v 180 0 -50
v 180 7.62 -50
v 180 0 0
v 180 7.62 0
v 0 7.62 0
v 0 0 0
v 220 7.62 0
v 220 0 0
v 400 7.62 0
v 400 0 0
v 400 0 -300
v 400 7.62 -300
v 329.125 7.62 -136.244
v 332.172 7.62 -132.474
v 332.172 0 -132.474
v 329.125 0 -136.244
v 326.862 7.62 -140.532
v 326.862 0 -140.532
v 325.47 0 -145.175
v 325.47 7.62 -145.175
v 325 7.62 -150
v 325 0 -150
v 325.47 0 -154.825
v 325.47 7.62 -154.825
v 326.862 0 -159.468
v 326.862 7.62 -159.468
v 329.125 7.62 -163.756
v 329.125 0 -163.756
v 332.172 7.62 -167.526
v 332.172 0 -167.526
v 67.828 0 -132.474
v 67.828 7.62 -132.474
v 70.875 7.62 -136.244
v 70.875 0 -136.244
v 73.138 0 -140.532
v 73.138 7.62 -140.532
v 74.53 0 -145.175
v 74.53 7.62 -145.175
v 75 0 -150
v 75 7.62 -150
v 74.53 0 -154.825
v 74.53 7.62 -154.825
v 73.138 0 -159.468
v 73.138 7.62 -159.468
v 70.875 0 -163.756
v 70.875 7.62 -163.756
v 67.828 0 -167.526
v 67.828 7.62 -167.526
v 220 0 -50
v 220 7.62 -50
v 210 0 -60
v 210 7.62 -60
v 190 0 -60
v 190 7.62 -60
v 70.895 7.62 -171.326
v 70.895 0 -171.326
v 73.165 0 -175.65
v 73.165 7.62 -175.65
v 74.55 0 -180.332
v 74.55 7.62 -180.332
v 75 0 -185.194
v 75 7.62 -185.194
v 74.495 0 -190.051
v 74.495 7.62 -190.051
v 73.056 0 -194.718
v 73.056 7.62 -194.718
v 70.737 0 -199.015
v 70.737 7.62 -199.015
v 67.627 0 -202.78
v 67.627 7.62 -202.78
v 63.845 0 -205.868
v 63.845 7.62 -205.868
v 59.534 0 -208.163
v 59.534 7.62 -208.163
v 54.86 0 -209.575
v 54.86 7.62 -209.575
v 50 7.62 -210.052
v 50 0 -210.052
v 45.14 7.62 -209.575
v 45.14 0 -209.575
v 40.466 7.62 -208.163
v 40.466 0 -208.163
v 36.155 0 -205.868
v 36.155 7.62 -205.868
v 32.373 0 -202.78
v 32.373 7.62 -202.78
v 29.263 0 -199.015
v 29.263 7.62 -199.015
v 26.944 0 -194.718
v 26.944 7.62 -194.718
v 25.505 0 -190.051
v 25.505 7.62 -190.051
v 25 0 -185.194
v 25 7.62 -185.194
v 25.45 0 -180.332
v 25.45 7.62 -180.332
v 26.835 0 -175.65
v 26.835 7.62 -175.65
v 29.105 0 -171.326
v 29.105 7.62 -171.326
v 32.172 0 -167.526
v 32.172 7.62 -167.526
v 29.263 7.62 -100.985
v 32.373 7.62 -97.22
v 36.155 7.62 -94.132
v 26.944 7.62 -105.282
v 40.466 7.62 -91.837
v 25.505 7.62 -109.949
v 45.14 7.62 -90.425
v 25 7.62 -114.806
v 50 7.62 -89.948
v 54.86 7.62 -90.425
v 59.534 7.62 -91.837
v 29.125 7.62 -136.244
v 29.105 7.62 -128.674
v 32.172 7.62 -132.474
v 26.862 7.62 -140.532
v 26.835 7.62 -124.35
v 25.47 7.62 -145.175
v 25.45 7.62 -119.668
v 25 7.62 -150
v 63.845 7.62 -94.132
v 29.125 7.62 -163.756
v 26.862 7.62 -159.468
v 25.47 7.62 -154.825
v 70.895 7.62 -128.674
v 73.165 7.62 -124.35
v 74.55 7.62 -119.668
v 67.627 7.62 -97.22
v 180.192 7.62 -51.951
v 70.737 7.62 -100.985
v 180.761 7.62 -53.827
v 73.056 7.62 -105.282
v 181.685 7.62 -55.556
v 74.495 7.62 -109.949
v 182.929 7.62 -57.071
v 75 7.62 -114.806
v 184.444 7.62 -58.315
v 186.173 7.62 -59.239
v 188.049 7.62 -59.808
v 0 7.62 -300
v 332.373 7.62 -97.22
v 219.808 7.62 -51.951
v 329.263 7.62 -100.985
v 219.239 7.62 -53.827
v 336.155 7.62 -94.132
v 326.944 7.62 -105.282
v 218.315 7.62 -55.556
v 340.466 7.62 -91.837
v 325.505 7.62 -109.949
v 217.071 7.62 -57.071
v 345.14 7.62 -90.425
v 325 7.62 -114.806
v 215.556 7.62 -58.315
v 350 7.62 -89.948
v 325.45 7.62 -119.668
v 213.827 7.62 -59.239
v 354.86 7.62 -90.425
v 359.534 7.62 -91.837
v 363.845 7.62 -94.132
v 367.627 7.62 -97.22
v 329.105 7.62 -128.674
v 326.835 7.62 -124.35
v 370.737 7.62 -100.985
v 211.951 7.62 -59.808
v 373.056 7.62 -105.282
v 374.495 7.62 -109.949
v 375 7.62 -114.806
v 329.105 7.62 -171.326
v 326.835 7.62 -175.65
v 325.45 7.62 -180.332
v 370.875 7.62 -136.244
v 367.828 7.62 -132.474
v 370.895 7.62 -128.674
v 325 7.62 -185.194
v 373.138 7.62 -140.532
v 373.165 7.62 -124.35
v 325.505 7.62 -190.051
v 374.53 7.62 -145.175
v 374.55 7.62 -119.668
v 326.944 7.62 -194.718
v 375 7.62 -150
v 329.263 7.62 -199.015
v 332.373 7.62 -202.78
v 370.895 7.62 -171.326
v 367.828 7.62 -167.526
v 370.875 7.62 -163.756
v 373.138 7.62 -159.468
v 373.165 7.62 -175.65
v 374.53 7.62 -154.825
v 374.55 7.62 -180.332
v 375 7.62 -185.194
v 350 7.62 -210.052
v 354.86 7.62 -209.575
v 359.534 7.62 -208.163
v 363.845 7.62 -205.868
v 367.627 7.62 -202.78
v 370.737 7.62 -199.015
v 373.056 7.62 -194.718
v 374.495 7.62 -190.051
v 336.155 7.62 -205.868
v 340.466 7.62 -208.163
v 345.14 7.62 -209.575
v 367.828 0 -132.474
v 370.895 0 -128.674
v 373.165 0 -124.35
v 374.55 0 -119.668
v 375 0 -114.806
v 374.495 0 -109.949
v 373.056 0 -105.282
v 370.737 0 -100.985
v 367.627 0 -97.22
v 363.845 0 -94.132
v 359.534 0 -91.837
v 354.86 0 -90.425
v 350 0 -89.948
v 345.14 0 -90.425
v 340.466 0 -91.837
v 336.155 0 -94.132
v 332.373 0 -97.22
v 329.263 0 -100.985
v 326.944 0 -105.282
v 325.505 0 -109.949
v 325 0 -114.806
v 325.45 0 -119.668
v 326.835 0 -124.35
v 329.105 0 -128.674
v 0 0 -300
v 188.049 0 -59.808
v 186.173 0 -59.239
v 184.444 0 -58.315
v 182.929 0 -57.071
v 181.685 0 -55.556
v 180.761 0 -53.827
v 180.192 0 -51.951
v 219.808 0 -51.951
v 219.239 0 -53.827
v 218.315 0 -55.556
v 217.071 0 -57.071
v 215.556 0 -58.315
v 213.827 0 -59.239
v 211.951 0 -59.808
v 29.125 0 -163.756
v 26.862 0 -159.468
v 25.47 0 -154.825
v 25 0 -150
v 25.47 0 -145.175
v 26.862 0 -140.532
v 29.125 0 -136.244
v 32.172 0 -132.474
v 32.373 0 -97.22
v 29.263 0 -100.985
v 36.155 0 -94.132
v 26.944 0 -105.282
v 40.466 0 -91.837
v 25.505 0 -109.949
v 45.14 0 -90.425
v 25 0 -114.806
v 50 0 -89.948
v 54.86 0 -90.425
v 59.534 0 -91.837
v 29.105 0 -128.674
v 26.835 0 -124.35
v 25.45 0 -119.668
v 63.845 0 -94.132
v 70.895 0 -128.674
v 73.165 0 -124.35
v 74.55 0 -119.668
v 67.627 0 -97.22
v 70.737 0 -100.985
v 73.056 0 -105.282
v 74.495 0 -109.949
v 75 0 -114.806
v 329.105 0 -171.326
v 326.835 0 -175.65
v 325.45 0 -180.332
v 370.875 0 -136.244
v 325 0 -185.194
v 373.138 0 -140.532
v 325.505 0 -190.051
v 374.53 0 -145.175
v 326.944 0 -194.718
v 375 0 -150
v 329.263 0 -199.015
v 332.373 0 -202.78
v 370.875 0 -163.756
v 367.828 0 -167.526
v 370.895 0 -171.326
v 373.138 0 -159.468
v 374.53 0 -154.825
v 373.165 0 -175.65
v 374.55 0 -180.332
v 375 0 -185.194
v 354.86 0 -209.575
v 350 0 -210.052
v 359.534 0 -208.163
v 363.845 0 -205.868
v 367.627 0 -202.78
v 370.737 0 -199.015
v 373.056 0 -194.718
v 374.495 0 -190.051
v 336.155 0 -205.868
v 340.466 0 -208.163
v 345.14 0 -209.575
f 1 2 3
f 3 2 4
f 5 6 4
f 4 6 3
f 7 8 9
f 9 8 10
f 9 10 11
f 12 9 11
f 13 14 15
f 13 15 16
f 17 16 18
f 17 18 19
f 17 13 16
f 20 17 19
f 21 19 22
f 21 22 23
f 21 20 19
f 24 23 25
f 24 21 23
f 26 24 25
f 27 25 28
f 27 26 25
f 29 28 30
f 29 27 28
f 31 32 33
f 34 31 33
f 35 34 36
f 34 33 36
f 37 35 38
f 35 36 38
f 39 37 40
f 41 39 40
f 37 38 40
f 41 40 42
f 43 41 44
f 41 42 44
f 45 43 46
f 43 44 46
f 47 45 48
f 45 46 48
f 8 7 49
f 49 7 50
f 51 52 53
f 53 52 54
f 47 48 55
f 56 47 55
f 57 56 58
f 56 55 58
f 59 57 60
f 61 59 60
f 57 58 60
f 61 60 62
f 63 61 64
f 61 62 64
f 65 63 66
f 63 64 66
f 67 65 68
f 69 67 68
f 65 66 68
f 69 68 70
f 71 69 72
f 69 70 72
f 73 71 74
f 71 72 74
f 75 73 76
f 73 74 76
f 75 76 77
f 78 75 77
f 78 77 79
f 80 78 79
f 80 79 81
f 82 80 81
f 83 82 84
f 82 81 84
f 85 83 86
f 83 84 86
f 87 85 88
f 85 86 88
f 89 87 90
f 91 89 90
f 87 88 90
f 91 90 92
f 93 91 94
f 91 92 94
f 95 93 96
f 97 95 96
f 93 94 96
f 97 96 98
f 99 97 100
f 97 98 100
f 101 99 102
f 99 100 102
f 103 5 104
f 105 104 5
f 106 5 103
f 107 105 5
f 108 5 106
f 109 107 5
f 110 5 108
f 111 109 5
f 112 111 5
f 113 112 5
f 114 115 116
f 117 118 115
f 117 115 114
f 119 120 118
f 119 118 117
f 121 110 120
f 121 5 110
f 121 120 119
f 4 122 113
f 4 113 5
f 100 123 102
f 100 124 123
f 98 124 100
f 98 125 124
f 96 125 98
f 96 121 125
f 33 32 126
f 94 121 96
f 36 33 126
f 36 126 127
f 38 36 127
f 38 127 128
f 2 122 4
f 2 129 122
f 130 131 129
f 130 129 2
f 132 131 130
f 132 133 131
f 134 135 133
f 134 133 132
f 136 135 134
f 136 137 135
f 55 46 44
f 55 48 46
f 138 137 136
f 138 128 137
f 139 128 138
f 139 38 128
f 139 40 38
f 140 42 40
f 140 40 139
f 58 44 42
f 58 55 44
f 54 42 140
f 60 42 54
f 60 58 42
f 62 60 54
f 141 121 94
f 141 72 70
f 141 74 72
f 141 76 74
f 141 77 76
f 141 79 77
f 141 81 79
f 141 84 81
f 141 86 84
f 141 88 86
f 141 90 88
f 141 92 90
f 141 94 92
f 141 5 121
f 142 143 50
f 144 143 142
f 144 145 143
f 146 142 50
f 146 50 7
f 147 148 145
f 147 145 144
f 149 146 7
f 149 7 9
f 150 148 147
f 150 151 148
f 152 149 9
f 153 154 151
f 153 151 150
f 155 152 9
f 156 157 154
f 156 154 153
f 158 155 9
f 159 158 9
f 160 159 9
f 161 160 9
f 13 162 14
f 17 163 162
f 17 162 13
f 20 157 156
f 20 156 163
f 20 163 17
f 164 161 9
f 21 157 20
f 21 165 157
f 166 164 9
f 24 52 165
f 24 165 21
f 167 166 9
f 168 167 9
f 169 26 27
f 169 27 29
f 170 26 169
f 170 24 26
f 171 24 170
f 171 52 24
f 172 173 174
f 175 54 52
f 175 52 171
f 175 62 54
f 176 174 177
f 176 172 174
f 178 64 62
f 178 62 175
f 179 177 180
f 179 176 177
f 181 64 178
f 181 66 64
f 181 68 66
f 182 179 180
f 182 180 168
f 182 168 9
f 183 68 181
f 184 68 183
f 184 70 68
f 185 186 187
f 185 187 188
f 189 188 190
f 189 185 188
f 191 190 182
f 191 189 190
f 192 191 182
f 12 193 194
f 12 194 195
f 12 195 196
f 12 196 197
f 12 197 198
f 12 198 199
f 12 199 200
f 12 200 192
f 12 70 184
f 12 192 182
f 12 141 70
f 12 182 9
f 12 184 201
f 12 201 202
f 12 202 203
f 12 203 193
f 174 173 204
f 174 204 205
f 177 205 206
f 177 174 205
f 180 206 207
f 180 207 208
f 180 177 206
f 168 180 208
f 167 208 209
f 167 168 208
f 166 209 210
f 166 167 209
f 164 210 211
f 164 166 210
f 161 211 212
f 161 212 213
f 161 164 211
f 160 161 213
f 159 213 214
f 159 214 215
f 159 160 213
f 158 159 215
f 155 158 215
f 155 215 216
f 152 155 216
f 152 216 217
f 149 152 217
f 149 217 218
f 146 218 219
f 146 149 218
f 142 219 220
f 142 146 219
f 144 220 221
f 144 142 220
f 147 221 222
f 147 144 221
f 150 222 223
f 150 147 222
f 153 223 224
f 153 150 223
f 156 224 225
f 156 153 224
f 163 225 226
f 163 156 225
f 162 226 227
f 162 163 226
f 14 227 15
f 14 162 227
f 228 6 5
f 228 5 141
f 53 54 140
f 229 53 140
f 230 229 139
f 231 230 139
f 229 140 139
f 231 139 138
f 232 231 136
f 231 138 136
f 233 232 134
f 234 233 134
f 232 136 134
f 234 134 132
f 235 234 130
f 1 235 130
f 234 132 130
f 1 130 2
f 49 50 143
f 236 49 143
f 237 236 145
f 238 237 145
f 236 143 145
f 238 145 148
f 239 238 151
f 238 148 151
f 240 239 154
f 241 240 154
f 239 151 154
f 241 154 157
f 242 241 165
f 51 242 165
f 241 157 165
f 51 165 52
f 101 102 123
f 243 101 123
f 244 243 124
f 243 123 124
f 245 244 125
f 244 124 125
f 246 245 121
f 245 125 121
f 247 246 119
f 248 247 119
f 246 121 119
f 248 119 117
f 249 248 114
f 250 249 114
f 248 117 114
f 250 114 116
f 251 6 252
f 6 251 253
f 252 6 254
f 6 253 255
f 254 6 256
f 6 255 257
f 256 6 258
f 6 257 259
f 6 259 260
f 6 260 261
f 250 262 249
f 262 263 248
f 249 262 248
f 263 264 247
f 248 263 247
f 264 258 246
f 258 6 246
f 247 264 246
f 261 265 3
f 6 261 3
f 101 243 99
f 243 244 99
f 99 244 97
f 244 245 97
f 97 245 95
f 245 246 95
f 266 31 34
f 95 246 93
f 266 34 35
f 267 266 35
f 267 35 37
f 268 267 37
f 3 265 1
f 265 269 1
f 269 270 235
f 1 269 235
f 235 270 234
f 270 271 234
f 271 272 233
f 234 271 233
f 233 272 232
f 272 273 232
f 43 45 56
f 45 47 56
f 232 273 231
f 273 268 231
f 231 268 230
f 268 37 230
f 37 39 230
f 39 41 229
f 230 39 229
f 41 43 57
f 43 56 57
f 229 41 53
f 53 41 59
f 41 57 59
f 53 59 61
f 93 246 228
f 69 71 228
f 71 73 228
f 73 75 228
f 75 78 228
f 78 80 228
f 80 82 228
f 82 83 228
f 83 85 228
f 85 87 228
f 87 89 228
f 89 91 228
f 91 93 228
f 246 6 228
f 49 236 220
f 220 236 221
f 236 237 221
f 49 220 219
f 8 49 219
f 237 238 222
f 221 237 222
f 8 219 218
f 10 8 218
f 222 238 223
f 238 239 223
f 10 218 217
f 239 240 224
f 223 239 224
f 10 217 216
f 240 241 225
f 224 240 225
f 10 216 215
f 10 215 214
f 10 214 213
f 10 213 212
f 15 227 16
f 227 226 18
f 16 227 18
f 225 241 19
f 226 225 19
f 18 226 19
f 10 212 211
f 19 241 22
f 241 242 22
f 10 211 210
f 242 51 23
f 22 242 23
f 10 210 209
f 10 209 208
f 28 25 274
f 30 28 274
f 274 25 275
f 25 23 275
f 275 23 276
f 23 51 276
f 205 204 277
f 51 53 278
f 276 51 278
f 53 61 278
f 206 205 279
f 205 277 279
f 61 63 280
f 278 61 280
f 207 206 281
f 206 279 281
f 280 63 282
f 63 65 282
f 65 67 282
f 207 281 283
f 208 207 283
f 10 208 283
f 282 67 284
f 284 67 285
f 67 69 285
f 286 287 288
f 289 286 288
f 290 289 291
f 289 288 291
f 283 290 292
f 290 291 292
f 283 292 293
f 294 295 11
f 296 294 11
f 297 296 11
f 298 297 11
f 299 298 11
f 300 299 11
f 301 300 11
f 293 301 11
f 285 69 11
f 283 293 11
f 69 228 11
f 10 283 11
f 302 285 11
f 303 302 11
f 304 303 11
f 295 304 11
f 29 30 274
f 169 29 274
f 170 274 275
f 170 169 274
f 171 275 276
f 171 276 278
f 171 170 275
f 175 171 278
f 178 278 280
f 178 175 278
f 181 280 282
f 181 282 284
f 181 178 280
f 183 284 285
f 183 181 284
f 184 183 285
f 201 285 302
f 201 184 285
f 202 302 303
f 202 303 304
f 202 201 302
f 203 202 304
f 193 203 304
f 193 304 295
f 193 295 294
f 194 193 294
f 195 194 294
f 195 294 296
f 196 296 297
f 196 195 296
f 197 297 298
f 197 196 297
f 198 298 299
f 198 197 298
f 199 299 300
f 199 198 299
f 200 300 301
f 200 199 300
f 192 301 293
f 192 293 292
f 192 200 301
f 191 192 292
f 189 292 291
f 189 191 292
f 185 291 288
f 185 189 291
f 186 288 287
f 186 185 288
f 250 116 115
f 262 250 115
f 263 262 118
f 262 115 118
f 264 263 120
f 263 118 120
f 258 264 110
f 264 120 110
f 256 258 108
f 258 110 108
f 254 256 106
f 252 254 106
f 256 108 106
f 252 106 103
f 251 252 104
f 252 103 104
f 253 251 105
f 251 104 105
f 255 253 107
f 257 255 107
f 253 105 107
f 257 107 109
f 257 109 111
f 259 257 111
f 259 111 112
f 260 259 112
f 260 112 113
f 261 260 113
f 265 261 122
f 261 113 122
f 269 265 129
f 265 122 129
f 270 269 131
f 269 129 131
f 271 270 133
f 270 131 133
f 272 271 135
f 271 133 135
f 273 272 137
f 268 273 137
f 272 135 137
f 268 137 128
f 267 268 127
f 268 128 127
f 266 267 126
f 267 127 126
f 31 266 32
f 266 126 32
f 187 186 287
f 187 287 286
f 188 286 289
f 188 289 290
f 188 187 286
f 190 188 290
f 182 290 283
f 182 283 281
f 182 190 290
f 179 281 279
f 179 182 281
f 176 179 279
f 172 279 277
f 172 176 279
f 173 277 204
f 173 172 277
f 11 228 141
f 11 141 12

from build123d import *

# Parameters (mm, degrees)
SKETCH1_W           = 400
SKETCH1_H           = 300
BOSS_EXTRUDE1_DEPTH = 7.62
CUT_EXTRUDE1_DEPTH  = 7.62
CUT_EXTRUDE2_DEPTH  = 7.62


with BuildPart() as part:
    # Sketch1 → Boss-Extrude1 (new body)
    with BuildSketch(Plane(origin=(0, 0, 0), x_dir=(1, 0, 0), z_dir=(0, 1, 0))):
        with Locations((200, 150)):
            Rectangle(SKETCH1_W, SKETCH1_H)
    extrude(amount=BOSS_EXTRUDE1_DEPTH)

    # Sketch2 → Cut-Extrude1 (cut)
    with BuildSketch(Plane(origin=(0, 7.62, 0), x_dir=(1, 0, 0), z_dir=(0, 1, 0))):
        with BuildLine():
            ThreePointArc((32.1719512, 167.526), (25, 150), (32.1719512, 132.474))
            ThreePointArc((32.1719512, 132.474), (50, 89.948), (67.8280488, 132.474))
            ThreePointArc((67.8280488, 132.474), (75, 150), (67.8280488, 167.526))
            ThreePointArc((67.8280488, 167.526), (50, 210.052), (32.1719512, 167.526))
        make_face()
        with BuildLine():
            ThreePointArc((367.8280488, 167.526), (375, 150), (367.8280488, 132.474))
            ThreePointArc((367.8280488, 132.474), (350, 89.948), (332.1719512, 132.474))
            ThreePointArc((332.1719512, 132.474), (325, 150), (332.1719512, 167.526))
            ThreePointArc((332.1719512, 167.526), (350, 210.052), (367.8280488, 167.526))
        make_face()
    extrude(amount=-CUT_EXTRUDE1_DEPTH, mode=Mode.SUBTRACT)

    # Sketch3 → Cut-Extrude2 (cut)
    with BuildSketch(Plane(origin=(0, 7.62, 0), x_dir=(1, 0, 0), z_dir=(0, 1, 0))):
        with BuildLine():
            Line((180, 0), (220, 0))
            Line((220, 0), (220, 50))
            ThreePointArc((220, 50), (217.071067812, 57.071067812), (210, 60))
            Line((210, 60), (190, 60))
            ThreePointArc((190, 60), (182.928932188, 57.071067812), (180, 50))
            Line((180, 50), (180, 0))
        make_face()
    extrude(amount=-CUT_EXTRUDE2_DEPTH, mode=Mode.SUBTRACT)


solid = part.part
